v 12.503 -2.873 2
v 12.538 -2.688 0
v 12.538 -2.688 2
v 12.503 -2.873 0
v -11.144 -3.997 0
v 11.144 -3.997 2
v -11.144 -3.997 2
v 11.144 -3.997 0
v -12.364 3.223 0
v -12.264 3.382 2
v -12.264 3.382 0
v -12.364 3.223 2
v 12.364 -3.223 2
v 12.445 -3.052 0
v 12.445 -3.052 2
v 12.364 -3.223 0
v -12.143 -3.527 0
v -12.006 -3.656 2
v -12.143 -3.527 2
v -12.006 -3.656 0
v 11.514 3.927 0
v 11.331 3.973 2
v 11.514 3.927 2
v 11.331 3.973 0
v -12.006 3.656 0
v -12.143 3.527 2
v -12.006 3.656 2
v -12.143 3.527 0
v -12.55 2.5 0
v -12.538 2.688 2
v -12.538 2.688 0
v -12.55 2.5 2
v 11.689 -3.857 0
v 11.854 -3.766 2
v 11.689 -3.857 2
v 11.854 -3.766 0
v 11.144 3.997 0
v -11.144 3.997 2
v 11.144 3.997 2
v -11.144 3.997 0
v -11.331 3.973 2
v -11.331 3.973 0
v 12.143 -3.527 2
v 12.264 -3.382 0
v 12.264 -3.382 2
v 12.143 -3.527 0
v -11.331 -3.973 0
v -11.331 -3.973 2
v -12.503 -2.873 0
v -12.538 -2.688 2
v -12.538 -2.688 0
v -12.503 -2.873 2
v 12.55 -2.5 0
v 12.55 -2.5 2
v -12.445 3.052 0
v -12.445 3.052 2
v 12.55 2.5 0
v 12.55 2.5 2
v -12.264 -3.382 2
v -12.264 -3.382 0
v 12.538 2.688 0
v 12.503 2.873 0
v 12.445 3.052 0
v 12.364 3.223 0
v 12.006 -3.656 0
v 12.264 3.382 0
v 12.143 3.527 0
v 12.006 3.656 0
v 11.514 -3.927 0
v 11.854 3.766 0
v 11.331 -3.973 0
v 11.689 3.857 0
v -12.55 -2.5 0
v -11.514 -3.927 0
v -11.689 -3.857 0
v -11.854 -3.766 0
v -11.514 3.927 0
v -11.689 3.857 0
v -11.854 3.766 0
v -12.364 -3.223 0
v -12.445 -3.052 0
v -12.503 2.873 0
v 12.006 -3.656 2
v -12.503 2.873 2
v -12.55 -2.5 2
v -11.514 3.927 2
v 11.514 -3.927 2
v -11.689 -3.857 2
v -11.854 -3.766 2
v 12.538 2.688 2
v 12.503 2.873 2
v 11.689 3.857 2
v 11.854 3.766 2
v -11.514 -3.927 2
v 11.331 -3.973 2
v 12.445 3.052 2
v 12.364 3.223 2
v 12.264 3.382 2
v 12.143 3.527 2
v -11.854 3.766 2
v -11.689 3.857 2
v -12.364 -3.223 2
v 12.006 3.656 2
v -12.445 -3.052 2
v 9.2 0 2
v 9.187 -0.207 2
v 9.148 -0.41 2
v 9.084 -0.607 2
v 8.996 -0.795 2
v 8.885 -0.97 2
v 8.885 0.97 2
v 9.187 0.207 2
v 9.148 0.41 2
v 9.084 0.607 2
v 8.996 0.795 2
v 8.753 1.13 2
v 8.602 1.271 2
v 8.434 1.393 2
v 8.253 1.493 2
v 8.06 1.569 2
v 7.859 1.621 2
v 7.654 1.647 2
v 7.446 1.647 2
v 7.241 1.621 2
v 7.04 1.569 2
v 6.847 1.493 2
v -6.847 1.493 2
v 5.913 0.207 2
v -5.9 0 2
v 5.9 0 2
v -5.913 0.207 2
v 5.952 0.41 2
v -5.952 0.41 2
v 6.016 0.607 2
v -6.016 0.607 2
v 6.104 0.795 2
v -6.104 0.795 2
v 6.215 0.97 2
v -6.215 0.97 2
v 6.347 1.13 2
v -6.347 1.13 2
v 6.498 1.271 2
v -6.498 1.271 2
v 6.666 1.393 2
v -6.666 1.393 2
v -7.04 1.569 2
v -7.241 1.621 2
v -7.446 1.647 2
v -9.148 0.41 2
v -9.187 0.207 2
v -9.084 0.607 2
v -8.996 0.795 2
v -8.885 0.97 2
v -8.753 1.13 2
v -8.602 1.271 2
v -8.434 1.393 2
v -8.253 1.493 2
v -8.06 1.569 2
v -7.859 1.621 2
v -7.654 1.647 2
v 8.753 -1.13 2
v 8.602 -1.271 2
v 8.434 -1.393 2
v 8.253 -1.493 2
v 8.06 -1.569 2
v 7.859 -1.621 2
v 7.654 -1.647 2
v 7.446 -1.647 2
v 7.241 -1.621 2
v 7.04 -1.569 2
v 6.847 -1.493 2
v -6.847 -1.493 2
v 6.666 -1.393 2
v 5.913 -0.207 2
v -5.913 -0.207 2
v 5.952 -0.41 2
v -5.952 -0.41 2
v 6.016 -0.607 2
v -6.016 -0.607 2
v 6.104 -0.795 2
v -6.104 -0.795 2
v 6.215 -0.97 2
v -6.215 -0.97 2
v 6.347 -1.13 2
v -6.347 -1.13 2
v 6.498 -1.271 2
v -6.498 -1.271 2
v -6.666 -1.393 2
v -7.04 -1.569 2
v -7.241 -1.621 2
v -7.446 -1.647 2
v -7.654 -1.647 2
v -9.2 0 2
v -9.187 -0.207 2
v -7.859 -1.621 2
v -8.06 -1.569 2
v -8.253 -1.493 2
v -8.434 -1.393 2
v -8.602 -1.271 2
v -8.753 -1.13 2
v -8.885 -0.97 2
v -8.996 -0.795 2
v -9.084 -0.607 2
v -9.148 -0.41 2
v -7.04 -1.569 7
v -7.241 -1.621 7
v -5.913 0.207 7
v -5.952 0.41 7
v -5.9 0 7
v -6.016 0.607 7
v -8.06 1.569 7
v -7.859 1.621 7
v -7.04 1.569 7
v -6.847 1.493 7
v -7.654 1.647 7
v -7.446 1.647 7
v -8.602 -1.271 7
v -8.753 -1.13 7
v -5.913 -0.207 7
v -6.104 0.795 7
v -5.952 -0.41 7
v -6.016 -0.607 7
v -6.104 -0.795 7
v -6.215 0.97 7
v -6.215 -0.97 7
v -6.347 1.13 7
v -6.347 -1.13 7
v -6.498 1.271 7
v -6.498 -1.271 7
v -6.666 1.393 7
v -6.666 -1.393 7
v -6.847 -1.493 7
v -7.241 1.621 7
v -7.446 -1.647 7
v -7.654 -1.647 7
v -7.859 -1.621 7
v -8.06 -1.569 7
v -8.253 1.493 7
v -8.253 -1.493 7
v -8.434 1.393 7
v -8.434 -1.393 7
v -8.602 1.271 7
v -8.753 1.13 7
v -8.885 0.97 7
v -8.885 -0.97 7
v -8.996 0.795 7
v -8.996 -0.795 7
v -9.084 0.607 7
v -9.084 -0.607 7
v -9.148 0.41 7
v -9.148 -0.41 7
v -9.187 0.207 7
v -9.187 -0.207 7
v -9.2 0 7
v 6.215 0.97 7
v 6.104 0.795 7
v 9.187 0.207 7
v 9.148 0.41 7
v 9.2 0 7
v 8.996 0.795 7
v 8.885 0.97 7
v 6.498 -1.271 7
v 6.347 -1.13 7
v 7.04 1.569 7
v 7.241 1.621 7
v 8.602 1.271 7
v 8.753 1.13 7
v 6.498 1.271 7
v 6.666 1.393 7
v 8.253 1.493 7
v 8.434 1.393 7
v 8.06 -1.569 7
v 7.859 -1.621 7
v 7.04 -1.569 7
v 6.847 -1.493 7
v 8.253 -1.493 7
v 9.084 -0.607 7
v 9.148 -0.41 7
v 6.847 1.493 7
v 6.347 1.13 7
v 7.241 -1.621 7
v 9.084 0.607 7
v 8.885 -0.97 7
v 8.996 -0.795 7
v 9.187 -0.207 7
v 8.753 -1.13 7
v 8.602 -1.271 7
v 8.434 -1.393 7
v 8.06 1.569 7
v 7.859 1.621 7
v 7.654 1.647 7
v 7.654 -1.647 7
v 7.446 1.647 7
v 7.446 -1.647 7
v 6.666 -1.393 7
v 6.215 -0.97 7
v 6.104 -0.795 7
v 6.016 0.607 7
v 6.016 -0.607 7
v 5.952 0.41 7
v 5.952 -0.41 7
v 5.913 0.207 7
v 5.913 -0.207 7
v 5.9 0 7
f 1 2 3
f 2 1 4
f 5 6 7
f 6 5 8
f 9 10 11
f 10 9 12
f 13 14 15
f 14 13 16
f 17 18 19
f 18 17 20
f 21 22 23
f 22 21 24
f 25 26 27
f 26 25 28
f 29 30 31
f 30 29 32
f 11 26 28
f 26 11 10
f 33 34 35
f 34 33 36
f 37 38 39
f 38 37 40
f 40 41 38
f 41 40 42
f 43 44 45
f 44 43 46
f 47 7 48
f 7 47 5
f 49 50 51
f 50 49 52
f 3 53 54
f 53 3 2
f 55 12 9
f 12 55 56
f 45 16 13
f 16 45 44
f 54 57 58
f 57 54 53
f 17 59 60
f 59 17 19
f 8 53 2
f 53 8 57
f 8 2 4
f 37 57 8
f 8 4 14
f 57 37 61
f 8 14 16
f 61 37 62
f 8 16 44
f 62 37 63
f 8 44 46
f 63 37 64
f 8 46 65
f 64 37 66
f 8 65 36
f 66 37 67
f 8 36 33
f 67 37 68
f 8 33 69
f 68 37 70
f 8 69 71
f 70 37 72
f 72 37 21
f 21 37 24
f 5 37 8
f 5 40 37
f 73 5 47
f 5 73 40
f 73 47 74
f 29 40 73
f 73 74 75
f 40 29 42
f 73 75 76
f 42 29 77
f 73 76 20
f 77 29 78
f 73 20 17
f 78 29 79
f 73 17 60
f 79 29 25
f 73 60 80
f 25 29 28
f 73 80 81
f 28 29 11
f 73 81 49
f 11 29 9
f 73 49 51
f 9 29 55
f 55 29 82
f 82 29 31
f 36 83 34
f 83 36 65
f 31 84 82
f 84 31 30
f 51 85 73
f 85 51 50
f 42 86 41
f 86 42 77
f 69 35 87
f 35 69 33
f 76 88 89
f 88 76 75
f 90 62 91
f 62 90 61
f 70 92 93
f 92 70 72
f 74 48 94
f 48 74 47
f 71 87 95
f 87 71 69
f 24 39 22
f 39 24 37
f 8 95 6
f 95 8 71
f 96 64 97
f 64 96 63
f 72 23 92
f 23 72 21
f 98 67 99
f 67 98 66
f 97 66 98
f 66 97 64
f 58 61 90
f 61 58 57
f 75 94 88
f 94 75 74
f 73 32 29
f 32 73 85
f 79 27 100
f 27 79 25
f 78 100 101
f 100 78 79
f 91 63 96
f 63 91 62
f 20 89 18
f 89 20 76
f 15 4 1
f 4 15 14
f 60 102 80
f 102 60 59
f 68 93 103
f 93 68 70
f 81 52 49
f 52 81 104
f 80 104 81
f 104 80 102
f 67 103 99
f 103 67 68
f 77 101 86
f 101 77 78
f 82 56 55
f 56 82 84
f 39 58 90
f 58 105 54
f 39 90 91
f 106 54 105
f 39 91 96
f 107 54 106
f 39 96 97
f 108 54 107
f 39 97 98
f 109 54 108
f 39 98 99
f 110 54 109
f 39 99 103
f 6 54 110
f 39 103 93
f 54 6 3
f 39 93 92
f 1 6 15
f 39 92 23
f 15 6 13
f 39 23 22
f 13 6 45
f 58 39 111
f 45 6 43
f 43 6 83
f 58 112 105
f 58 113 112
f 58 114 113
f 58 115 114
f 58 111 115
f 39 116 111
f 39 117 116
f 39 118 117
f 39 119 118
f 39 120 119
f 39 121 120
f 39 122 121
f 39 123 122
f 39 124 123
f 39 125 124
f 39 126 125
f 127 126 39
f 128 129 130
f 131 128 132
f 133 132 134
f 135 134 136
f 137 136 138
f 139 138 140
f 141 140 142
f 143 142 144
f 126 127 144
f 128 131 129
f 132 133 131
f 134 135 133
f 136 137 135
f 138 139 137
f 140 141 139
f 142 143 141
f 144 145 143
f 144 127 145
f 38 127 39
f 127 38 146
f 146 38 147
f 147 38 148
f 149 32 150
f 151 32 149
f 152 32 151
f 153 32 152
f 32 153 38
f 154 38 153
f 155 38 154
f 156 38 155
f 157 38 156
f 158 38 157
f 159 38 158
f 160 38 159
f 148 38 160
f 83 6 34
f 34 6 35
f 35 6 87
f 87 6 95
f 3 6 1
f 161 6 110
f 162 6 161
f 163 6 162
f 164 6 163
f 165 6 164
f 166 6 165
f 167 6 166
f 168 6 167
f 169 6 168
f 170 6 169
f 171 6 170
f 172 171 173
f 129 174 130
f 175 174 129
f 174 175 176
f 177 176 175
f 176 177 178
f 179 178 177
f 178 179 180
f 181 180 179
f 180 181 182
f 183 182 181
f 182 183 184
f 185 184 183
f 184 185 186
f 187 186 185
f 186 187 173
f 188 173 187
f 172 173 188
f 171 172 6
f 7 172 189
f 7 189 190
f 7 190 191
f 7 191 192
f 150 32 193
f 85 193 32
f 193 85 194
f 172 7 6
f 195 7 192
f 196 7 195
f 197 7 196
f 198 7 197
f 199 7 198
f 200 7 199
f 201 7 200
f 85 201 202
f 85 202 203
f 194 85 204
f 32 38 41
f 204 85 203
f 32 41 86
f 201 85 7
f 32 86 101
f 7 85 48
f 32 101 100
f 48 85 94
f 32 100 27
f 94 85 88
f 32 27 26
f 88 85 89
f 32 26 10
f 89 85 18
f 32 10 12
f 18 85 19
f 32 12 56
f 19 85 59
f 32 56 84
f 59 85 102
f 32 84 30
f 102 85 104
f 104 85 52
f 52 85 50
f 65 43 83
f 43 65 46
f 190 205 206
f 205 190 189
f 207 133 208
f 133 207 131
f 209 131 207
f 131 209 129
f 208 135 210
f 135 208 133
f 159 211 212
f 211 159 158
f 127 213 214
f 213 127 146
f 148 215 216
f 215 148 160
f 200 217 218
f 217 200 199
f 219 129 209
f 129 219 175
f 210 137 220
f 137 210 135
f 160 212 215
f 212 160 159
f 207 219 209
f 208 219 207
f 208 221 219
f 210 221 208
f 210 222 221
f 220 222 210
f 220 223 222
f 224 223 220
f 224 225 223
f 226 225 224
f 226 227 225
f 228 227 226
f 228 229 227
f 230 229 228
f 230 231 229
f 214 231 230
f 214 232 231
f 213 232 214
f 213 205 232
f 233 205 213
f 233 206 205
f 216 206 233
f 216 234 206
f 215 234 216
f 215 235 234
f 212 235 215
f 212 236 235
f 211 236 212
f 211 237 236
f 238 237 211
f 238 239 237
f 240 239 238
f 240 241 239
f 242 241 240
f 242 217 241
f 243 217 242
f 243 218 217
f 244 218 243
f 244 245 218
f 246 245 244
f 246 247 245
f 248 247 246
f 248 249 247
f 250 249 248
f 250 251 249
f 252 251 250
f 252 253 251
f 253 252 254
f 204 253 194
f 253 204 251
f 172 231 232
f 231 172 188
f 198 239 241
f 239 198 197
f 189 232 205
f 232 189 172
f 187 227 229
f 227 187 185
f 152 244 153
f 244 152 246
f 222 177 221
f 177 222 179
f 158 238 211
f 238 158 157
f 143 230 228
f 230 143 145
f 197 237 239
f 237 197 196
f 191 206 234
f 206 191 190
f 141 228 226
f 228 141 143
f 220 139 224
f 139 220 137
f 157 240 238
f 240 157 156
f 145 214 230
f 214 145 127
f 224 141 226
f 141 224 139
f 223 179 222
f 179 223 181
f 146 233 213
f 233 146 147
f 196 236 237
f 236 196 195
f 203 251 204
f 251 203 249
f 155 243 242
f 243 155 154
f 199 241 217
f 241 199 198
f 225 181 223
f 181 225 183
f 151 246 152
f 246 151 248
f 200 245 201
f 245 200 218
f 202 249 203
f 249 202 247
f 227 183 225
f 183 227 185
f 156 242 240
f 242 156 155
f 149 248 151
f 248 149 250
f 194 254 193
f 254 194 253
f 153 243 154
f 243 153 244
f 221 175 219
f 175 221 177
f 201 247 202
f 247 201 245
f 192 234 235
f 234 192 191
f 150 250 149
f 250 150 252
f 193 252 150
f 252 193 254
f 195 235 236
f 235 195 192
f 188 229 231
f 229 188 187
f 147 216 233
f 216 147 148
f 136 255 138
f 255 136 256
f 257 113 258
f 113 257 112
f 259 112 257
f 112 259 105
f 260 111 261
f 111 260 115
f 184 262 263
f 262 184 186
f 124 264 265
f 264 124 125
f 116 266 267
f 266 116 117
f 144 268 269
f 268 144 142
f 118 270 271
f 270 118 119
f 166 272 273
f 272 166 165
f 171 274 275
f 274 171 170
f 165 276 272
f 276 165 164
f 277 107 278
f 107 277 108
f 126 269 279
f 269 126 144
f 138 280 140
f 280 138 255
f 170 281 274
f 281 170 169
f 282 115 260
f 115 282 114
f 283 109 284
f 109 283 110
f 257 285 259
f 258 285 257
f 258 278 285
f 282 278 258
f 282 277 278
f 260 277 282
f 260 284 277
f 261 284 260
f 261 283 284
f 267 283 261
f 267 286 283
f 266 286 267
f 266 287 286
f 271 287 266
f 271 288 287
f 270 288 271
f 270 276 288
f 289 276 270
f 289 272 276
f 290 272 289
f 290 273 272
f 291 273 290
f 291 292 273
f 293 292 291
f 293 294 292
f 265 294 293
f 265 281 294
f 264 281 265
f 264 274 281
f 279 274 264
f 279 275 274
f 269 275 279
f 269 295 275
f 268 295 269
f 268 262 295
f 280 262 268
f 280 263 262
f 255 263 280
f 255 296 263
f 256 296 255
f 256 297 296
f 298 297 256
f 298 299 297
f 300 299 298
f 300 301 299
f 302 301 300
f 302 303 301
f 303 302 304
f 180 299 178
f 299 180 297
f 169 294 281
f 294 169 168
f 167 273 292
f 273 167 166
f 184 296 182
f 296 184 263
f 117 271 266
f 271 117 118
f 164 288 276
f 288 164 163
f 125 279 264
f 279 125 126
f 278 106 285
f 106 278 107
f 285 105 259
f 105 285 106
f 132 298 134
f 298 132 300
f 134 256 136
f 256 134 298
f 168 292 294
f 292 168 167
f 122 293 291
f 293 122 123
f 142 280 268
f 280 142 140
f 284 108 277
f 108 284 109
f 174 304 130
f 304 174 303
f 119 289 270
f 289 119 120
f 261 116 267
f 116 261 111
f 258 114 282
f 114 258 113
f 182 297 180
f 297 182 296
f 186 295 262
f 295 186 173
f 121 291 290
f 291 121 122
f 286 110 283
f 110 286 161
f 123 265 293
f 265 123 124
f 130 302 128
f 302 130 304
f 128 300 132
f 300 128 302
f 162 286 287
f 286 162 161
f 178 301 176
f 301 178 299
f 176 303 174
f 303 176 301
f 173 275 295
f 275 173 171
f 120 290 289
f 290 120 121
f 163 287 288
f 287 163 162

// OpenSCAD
$fn=50;

holeDifference=(18.30+11.9)/2;
holeDiamseter=3.3;
height=7;
thickness=2;
width=8;
length=holeDifference+10;
round=3;


hull() {
    translate([-length/2+round/2,-width/2+round/2,0]) {
        cylinder(h=thickness, d=round);
    }
    translate([length/2-round/2,-width/2+round/2,0]) {
        cylinder(h=thickness, d=round);
    }
    translate([-length/2+round/2,width/2-round/2,0]) {
        cylinder(h=thickness, d=round);
    }
    translate([length/2-round/2,width/2-round/2,0]) {
        cylinder(h=thickness, d=round);
    }
}

translate([-holeDifference/2,0,0]) {
    cylinder(h=height, d=holeDiamseter);
}

translate([holeDifference/2,0,0]) {
    cylinder(h=height, d=holeDiamseter);
}
